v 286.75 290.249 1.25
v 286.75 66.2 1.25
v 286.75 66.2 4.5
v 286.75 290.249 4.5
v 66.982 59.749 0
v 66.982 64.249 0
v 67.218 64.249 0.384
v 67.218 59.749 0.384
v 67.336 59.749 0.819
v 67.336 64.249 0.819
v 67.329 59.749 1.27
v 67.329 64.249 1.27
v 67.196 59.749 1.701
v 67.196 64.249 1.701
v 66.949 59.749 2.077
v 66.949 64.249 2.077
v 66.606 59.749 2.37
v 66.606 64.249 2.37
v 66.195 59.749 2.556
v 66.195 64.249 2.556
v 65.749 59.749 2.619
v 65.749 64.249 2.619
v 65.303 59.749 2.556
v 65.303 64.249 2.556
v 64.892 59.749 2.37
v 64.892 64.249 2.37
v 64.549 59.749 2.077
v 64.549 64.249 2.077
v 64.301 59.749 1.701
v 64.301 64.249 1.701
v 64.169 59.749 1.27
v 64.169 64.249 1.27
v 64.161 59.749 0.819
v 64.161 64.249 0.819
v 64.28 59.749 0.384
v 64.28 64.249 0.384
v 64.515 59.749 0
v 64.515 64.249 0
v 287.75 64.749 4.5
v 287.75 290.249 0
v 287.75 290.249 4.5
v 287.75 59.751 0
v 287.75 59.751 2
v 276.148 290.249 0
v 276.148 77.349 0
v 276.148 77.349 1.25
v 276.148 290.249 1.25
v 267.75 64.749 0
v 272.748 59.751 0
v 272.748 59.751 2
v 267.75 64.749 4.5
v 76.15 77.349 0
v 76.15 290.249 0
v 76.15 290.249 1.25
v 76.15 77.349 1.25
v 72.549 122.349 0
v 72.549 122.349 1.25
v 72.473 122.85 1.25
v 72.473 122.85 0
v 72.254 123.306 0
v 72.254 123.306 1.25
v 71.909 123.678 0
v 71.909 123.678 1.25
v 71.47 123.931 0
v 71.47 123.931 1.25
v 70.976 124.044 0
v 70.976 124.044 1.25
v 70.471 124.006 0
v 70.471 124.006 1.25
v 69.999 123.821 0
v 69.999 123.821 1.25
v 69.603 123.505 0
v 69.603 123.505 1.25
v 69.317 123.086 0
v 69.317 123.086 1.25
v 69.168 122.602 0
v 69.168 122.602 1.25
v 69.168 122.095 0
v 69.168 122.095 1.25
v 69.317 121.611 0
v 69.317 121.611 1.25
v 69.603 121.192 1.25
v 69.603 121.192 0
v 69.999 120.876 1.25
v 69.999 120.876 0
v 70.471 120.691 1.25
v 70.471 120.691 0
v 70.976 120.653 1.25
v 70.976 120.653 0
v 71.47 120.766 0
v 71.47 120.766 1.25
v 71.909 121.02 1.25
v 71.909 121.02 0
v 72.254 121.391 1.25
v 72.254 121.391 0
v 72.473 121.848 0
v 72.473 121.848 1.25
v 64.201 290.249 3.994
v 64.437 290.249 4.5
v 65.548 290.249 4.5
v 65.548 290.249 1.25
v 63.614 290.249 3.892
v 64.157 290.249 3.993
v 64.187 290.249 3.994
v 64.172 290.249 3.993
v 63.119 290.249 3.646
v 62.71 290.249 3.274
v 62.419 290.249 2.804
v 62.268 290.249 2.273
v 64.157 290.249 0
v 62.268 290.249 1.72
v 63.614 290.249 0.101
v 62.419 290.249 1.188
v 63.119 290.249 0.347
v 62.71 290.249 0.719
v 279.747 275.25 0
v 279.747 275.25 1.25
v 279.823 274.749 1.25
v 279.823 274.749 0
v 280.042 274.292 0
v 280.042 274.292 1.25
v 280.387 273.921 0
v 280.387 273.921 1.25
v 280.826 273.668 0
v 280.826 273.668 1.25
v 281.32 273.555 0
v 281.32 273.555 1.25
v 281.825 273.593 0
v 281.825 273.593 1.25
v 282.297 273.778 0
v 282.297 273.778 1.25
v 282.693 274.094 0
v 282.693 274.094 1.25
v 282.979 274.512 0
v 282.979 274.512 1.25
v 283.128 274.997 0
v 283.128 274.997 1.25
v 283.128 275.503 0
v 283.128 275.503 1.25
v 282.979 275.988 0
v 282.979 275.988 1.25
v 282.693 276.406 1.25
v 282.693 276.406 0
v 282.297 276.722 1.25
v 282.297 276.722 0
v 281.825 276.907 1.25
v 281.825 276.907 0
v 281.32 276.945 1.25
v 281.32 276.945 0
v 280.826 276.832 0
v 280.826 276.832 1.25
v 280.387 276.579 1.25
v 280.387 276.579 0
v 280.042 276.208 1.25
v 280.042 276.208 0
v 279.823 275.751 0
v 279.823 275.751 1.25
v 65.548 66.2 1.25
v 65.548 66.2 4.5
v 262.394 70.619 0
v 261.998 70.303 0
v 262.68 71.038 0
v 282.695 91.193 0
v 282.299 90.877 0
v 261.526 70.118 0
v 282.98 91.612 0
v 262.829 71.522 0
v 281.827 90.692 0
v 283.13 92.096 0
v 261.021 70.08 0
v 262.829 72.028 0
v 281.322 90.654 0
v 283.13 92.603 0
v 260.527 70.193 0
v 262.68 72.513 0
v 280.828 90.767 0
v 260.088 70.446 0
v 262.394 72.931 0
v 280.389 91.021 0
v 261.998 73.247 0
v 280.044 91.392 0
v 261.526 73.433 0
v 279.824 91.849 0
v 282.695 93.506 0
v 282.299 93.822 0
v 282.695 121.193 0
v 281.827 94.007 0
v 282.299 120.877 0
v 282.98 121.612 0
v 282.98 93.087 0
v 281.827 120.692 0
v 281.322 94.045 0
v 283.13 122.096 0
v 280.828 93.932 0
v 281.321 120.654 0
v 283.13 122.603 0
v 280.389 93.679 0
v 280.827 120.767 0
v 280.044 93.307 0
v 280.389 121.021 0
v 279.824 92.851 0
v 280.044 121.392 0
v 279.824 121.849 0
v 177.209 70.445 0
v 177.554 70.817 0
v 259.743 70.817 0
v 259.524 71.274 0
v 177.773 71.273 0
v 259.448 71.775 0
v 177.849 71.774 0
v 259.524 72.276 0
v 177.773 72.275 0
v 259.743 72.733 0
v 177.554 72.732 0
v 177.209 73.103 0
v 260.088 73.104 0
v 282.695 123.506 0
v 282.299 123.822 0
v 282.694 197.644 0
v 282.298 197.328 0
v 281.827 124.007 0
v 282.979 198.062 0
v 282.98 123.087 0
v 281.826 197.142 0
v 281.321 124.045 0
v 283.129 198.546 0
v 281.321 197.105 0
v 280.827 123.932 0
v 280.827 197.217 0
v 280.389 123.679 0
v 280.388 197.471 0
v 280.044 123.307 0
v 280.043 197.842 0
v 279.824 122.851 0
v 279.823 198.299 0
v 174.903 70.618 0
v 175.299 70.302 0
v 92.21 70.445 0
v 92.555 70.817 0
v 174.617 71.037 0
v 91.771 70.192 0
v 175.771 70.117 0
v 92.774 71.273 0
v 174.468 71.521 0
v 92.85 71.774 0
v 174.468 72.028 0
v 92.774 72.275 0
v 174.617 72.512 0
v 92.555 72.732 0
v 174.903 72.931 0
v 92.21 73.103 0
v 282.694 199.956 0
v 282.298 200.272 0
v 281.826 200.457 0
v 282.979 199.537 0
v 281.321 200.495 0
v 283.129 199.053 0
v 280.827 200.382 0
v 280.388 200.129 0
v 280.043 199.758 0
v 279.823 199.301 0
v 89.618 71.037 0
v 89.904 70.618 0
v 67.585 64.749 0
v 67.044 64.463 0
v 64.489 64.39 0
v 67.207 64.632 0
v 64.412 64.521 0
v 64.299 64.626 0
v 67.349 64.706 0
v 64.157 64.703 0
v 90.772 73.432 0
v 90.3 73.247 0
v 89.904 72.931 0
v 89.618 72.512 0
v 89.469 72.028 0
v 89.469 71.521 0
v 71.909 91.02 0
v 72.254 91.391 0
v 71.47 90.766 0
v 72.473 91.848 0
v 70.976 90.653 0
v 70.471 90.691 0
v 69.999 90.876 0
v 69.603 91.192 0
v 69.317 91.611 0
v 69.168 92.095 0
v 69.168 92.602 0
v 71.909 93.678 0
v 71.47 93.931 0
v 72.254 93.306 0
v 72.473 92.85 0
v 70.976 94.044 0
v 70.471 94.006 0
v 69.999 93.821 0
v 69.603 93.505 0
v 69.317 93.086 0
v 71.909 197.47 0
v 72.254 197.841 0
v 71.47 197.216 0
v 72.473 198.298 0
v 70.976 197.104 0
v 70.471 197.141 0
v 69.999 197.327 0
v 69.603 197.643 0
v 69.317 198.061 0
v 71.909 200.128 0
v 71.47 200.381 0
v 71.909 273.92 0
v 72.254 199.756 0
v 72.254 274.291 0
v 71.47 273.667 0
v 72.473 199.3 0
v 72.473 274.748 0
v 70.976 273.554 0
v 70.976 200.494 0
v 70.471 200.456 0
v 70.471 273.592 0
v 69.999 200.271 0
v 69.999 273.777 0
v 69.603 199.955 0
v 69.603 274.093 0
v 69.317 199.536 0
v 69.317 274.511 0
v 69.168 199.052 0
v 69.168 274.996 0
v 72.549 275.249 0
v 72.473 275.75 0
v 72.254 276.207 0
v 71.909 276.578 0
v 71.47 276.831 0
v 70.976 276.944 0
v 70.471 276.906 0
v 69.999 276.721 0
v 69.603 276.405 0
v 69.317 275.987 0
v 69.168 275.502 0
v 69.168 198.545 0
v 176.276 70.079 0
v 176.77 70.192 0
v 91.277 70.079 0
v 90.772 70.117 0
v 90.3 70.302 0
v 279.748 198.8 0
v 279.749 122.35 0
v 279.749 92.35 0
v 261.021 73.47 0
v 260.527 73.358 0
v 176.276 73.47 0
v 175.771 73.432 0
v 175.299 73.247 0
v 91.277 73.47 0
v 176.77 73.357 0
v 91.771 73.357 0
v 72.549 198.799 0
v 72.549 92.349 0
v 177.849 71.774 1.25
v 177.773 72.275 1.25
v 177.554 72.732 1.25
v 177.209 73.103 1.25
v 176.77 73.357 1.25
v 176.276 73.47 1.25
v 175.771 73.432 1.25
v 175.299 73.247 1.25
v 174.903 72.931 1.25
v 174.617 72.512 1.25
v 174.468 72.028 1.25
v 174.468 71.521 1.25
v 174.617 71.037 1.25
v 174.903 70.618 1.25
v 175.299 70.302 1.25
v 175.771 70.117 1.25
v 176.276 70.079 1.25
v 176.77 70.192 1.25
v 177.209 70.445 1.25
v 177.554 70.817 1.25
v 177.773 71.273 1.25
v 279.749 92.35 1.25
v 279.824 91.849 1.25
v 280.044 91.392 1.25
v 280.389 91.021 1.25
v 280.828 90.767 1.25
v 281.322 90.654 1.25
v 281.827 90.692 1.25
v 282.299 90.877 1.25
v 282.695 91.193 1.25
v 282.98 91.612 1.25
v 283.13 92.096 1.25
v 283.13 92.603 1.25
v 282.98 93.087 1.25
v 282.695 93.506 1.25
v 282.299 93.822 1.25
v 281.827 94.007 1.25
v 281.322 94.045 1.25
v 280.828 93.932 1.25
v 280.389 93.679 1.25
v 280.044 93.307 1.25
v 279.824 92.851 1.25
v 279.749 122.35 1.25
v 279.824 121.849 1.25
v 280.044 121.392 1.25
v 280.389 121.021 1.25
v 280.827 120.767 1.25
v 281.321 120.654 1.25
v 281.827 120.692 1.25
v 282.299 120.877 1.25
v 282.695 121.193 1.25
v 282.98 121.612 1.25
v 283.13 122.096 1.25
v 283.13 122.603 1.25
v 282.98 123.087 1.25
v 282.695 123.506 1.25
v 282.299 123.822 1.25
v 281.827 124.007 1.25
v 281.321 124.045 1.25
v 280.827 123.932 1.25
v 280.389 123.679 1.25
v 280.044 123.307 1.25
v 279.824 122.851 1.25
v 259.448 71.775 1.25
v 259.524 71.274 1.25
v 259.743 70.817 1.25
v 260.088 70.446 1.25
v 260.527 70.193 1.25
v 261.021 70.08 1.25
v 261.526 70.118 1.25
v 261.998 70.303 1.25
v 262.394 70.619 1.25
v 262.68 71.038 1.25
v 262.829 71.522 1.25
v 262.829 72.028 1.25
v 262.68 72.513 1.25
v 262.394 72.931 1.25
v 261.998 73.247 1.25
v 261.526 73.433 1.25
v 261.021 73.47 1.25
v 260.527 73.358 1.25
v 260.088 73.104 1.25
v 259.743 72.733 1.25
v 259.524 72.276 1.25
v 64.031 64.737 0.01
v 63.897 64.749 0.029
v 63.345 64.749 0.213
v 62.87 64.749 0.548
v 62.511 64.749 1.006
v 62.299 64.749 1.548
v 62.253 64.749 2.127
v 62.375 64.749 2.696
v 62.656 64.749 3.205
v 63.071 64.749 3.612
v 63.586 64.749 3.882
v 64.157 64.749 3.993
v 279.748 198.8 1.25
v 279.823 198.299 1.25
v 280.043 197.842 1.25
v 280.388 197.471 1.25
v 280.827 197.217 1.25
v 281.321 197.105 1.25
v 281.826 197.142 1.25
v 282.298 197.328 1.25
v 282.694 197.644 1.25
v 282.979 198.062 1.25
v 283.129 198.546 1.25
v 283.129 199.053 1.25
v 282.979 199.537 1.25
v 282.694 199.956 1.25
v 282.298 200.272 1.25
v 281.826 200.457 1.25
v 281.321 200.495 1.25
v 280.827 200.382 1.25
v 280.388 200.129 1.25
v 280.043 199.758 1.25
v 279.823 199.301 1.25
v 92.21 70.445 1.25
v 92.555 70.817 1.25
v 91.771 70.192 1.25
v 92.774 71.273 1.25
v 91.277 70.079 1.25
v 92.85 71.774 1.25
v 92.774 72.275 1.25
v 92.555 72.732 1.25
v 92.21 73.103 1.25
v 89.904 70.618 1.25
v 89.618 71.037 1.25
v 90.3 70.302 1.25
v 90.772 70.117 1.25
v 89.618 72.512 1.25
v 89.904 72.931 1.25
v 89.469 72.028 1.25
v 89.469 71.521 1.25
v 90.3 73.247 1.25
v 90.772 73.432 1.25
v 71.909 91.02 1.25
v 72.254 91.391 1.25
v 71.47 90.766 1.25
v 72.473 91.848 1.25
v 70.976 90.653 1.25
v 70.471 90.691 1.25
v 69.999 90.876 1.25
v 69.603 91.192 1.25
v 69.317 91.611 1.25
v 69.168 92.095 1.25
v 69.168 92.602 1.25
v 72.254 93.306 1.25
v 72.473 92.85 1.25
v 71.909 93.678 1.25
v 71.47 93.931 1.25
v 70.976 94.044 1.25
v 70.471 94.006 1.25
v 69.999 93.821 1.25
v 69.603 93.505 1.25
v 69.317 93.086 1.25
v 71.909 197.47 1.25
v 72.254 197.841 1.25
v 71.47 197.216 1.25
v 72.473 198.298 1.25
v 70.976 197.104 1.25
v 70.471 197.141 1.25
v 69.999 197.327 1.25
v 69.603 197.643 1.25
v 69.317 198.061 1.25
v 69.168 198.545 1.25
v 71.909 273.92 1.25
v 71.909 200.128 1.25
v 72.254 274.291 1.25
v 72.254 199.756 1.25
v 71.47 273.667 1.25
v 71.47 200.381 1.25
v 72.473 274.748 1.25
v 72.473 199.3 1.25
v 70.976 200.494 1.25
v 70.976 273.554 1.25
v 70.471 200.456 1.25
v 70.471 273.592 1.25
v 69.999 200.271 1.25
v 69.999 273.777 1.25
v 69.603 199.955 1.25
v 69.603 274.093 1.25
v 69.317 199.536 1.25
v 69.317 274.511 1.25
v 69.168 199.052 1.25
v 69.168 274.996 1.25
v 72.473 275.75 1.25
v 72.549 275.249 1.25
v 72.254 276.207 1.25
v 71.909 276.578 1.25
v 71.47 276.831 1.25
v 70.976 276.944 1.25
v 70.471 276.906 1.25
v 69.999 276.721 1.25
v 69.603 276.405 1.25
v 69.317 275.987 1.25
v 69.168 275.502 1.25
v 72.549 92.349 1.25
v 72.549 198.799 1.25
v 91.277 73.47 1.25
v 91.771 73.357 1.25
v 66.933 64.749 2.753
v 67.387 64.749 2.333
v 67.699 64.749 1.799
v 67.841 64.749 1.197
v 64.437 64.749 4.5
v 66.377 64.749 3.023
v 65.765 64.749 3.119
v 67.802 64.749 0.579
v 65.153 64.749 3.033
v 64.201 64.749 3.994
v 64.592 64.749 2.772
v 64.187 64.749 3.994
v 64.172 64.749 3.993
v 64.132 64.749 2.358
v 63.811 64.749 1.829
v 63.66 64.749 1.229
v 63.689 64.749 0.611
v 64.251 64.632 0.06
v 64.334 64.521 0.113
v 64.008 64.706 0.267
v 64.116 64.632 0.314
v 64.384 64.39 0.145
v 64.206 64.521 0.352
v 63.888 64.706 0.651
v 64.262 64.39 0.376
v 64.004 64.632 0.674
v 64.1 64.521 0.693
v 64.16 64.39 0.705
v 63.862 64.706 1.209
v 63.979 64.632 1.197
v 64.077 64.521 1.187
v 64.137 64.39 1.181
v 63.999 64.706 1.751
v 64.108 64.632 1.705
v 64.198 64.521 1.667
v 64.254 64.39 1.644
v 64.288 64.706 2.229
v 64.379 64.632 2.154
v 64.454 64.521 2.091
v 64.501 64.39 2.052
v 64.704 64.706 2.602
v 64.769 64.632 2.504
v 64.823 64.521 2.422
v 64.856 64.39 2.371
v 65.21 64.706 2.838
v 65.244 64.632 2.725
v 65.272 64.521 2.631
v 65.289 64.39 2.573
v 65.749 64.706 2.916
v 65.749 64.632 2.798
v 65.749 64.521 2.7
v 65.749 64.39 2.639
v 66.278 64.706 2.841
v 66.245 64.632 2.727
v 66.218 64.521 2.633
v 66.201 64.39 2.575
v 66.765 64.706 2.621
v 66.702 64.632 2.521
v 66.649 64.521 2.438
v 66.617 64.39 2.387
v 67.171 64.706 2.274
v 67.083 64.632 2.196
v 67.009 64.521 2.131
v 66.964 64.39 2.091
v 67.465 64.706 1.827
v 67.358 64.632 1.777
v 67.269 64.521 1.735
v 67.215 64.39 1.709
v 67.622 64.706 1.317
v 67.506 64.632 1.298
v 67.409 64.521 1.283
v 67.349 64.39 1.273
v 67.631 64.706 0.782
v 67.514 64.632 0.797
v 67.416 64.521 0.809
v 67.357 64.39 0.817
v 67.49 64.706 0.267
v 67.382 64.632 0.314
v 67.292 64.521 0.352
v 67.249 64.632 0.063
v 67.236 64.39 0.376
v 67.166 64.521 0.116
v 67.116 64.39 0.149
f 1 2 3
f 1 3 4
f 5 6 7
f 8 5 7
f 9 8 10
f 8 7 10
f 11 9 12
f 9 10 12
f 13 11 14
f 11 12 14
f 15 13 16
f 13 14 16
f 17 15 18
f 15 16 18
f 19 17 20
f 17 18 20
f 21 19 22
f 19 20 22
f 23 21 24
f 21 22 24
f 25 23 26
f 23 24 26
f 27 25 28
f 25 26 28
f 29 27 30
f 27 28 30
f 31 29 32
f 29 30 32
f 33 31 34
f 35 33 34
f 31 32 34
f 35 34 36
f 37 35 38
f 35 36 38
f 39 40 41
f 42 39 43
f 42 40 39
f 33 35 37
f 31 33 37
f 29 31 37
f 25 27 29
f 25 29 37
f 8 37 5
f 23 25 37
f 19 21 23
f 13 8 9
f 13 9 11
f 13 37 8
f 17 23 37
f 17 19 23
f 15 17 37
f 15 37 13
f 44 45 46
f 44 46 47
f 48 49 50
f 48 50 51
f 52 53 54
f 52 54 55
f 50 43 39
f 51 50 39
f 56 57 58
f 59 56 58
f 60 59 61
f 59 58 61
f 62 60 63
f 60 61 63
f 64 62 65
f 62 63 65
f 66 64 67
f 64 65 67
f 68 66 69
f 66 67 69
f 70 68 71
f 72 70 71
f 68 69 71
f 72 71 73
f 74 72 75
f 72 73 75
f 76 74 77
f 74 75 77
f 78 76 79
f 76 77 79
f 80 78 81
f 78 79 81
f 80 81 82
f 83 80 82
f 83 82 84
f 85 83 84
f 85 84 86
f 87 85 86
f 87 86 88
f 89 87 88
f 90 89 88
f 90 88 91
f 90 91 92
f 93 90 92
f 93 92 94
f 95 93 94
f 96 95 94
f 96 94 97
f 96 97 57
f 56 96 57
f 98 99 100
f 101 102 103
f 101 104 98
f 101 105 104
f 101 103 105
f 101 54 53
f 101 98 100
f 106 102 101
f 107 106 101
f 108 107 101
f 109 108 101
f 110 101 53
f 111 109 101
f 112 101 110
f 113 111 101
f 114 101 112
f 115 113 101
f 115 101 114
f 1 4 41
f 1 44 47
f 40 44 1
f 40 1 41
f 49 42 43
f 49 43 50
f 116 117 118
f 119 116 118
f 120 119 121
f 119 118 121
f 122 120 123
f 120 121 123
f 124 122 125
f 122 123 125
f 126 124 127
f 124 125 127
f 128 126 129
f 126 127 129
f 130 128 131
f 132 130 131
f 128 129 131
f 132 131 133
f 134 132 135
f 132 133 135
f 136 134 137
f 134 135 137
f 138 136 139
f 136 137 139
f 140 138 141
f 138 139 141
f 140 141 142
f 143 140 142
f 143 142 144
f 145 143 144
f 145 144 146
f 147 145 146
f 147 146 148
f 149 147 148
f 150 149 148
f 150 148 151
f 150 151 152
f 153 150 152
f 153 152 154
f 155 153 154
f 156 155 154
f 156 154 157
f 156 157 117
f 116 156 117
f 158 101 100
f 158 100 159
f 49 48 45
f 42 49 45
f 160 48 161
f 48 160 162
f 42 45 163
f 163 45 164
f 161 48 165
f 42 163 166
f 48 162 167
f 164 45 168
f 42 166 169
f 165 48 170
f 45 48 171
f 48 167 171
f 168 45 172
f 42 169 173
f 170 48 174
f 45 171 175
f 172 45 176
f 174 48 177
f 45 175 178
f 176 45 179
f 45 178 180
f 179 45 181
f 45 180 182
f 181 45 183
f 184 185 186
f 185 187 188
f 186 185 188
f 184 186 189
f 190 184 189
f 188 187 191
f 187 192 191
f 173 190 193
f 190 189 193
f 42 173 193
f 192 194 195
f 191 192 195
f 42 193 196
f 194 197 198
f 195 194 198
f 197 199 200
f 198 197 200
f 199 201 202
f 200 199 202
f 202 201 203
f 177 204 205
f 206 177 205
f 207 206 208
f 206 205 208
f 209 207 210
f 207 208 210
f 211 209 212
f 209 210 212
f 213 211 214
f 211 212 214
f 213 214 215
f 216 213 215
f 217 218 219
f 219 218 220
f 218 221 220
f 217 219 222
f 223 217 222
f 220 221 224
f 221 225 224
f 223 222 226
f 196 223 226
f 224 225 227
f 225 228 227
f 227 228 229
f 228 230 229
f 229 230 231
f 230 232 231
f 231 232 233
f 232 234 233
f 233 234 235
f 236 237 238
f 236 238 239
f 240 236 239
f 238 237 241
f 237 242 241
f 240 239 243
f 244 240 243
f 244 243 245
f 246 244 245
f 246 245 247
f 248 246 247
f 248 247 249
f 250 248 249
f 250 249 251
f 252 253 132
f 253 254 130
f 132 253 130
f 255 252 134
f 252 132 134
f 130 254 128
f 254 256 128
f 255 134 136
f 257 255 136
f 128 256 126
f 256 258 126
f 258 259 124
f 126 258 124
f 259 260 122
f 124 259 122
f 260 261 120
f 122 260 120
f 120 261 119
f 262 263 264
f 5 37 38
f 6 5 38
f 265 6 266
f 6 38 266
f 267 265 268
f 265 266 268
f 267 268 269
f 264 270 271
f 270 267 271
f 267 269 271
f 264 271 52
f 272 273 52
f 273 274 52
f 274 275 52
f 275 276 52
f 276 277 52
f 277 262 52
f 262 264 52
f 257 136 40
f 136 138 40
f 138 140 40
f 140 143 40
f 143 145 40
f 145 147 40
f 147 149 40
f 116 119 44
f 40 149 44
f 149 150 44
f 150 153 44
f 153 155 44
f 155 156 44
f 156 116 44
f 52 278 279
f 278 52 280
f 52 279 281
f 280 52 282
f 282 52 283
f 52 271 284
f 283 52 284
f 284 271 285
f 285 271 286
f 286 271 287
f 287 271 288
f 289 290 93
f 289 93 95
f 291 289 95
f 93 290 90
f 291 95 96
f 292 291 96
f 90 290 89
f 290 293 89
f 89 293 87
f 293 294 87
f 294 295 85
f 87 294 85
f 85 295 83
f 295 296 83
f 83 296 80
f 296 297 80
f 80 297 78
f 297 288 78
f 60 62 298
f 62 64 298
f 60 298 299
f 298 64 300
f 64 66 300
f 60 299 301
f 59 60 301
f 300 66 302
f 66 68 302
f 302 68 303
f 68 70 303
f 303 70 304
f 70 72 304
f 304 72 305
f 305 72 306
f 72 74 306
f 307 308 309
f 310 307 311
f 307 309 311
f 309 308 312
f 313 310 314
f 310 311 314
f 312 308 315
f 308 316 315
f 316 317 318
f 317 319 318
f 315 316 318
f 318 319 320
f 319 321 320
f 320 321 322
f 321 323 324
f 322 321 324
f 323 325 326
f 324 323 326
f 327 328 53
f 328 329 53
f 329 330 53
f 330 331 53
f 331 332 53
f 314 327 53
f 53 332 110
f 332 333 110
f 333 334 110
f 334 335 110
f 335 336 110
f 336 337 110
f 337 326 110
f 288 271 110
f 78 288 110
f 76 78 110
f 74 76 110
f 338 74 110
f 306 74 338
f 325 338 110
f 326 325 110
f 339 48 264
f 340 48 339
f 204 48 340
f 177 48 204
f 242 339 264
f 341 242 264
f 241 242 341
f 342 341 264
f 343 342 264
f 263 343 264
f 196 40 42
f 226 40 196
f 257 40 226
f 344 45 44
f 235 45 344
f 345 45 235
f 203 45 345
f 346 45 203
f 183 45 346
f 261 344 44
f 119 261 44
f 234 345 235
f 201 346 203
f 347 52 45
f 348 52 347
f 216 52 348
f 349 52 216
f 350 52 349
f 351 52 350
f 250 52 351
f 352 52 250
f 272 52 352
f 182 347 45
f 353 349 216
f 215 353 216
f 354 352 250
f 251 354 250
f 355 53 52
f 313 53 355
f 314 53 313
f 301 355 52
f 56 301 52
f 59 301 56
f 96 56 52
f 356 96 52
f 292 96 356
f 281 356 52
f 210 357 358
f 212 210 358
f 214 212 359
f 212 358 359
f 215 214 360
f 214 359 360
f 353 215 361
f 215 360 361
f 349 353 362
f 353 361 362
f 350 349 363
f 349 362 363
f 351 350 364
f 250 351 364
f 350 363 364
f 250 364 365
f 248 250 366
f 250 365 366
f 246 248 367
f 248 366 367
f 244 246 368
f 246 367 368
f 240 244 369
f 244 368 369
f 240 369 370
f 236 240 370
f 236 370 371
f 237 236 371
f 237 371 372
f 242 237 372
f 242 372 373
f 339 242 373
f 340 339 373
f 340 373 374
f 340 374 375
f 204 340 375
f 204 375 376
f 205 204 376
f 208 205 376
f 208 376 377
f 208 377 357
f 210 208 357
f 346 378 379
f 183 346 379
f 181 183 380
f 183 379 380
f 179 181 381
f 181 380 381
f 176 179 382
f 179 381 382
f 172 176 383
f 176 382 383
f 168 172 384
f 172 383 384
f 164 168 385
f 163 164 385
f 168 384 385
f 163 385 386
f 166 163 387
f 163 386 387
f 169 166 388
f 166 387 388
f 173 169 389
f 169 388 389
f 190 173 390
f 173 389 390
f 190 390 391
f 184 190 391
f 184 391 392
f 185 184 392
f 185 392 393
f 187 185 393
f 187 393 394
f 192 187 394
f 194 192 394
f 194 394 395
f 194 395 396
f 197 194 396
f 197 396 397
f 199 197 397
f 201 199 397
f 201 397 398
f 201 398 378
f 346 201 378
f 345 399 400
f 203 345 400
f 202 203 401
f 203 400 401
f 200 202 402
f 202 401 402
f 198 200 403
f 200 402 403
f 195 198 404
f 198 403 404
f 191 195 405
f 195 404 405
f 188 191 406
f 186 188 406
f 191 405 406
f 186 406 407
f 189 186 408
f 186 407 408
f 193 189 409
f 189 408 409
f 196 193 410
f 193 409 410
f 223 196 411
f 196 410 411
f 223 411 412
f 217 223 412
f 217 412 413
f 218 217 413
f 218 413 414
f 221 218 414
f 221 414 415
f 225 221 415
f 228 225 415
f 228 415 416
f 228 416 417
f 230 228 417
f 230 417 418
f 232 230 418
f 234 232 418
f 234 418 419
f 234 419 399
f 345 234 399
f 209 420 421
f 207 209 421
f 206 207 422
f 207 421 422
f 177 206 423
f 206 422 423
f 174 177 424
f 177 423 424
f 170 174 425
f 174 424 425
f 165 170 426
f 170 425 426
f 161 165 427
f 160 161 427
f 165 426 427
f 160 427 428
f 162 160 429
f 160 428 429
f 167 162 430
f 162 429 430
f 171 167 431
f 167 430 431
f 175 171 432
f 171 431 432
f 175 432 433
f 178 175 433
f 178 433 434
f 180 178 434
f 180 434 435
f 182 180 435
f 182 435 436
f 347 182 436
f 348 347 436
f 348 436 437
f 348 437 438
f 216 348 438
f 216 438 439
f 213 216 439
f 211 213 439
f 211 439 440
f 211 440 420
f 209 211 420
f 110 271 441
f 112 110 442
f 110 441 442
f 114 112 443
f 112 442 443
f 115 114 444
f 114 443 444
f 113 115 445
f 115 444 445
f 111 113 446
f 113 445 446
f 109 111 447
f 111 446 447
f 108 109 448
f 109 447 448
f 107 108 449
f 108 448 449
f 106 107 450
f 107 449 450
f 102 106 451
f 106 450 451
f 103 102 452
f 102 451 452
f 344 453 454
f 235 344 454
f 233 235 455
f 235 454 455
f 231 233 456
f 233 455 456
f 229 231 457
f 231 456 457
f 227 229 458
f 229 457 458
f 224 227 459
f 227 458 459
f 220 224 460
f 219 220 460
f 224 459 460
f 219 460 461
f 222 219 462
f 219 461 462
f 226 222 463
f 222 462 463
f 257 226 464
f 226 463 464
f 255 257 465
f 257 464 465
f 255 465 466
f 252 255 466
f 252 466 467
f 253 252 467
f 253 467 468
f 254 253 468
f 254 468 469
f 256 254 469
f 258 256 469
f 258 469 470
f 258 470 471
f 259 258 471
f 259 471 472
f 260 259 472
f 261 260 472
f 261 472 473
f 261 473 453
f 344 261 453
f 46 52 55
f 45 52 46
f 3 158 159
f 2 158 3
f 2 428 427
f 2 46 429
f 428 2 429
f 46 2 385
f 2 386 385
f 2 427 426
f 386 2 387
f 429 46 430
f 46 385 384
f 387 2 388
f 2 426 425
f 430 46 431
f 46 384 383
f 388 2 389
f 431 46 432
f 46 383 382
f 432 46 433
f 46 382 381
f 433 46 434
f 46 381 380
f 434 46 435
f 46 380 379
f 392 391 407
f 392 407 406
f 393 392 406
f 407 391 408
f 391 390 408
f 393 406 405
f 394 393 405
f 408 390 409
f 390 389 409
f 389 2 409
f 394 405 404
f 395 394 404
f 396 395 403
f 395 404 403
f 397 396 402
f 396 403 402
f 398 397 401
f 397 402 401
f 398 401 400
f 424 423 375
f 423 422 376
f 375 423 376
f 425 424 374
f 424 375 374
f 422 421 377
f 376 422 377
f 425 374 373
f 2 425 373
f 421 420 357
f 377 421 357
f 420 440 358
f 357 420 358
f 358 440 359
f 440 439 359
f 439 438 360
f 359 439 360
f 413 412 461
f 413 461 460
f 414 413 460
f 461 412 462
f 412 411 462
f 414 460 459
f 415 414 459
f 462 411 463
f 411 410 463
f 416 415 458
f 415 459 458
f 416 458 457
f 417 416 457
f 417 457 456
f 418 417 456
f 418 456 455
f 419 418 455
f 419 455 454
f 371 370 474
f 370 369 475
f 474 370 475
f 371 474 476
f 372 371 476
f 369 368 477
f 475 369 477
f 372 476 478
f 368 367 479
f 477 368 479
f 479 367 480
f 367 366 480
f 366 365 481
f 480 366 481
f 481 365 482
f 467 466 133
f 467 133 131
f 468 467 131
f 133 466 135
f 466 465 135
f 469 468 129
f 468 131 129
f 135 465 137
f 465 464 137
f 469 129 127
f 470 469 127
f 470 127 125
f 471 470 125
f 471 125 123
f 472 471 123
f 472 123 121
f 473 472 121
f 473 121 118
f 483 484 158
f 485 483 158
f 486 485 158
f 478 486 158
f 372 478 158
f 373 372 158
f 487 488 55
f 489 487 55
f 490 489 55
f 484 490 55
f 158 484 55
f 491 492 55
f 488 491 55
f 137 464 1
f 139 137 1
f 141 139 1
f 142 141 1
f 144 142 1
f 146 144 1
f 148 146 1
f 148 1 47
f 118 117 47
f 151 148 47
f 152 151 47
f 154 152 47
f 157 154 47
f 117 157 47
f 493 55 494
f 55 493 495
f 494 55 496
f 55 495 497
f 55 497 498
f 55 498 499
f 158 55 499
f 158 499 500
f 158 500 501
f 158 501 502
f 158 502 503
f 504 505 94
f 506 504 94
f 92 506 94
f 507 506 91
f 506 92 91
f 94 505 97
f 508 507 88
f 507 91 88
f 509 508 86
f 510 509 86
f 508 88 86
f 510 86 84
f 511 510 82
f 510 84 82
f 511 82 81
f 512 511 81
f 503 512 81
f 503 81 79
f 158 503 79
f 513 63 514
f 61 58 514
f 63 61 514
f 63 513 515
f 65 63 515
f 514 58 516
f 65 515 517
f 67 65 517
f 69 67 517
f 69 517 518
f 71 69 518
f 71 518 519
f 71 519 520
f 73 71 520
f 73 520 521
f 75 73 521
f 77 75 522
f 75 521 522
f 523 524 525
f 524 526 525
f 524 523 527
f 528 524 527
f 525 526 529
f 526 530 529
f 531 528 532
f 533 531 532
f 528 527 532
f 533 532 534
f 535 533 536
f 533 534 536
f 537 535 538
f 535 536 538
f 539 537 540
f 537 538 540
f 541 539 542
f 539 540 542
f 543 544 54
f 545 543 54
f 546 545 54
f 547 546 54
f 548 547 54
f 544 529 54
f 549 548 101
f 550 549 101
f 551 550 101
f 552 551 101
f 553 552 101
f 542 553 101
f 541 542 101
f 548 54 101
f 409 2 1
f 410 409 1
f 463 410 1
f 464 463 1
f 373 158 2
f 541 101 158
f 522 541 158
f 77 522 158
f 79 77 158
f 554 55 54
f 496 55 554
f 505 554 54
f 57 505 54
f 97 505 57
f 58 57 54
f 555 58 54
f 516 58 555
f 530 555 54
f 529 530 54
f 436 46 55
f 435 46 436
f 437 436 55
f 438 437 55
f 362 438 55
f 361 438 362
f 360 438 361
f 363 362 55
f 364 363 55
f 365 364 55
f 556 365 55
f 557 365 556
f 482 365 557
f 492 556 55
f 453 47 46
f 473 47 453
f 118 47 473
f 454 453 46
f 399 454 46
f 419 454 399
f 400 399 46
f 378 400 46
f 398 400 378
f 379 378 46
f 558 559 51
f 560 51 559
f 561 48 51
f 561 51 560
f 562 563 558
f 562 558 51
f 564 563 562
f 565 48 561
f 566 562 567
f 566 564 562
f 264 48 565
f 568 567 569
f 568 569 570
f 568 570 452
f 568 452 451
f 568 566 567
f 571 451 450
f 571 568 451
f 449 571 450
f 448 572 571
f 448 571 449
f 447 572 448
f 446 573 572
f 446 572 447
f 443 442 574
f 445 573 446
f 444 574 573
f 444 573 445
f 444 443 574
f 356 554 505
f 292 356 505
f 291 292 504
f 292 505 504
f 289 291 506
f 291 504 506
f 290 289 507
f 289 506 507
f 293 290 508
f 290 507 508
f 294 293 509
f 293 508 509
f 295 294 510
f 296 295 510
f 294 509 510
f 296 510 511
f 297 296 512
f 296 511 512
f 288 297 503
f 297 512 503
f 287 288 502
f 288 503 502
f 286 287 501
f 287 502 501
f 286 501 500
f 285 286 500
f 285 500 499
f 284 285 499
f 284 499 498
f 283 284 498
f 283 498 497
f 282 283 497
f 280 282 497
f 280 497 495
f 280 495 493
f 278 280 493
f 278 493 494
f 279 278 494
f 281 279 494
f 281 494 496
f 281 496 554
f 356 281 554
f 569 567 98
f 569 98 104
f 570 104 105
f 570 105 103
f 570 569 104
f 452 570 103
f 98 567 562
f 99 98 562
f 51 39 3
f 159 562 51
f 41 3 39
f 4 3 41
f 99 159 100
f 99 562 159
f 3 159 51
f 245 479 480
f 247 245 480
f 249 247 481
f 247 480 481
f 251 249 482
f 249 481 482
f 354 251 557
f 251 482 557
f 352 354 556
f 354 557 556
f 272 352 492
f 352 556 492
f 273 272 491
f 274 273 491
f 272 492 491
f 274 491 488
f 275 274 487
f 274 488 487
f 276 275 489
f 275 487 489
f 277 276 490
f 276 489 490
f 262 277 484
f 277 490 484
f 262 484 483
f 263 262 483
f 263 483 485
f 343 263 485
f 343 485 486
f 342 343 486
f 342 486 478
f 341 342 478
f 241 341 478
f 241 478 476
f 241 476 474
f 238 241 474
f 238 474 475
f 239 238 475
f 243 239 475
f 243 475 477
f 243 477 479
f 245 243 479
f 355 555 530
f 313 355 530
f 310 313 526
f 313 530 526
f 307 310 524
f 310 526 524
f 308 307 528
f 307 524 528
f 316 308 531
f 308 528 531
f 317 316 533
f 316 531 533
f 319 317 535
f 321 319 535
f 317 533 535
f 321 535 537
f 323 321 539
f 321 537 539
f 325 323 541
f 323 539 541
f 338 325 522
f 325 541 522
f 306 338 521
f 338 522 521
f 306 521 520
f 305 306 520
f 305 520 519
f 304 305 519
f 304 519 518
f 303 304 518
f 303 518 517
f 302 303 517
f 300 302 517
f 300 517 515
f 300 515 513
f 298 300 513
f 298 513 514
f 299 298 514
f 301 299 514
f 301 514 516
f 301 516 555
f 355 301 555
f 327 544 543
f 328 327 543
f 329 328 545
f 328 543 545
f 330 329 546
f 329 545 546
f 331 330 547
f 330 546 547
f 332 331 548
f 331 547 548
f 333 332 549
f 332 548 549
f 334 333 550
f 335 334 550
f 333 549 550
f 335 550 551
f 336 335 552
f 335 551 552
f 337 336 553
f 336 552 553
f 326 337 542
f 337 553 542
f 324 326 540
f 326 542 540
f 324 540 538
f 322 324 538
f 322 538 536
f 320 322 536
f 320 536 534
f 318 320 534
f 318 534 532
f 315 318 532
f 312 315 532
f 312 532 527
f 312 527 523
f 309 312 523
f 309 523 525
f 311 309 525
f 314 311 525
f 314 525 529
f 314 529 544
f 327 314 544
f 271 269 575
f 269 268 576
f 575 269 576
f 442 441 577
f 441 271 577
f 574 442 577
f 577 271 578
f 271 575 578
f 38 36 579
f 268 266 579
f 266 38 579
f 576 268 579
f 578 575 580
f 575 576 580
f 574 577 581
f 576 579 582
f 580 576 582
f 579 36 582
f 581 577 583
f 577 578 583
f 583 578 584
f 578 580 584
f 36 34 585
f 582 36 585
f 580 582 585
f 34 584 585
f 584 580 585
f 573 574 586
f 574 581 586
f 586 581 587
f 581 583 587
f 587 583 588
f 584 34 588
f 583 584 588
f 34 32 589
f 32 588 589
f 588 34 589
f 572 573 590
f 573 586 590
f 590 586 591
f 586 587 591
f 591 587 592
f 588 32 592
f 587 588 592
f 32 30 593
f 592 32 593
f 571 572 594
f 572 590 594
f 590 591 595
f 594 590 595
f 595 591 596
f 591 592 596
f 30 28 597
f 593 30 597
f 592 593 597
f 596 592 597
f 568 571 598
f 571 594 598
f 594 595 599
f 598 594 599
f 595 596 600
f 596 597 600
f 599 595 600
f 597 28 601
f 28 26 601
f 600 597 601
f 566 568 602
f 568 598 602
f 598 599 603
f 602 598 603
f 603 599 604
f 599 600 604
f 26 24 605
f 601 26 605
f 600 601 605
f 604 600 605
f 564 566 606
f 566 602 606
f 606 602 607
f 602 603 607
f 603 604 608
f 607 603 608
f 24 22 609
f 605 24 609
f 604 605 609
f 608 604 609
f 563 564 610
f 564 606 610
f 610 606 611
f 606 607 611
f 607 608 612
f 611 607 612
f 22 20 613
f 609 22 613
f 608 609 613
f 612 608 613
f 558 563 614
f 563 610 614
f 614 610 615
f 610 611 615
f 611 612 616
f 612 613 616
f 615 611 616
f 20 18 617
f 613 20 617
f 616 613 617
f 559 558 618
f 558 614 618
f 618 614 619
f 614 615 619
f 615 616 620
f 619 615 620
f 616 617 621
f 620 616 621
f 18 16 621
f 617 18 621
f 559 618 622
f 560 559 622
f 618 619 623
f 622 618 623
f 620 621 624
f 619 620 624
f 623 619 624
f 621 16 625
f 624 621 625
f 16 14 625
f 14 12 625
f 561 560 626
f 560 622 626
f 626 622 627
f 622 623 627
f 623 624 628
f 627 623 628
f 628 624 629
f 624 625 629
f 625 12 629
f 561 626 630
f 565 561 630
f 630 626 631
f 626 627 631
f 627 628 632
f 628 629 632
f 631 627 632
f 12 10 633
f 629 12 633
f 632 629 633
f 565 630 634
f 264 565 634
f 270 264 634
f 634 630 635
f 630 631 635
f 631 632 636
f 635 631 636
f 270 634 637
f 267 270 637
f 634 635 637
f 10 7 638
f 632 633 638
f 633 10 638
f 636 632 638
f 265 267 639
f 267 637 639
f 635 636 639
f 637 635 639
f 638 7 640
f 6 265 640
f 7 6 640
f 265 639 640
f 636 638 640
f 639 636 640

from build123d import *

# Parameters (mm, degrees)
SALIENTE_EXTRUIR1_DEPTH = 1.25
SALIENTE_EXTRUIR2_DEPTH = 3.25
SALIENTE_EXTRUIR3_DEPTH = 5
SALIENTE_EXTRUIR4_DEPTH = 225.499987602
SALIENTE_EXTRUIR6_REACH = 368.413
CROQUIS6_W              = 4.5
CROQUIS6_H              = 225.499987602
CHAFL_N1_SIZE           = 0.6
CHAFL_N1_SIZE_2         = 0.279784595
REDONDEO1_R             = 0.5
CORTAR_EXTRUIR1_REACH   = 369.581
CROQUIS8_R              = 1.7
CORTAR_EXTRUIR2_DEPTH   = 409.723751009


with BuildPart() as part:
    # Croquis1 → Saliente-Extruir1 (new body)
    with BuildSketch(Plane.XY):
        Polygon((287.750005722, 59.751000255), (272.747904062, 59.751000255), (267.749905586, 64.749002457), (64.157357861, 64.749002457), (64.553998411, 290.248990059), (76.149903238, 290.248990059), (76.149903238, 77.348701656), (276.148021221, 77.348701656), (276.148021221, 290.248990059), (287.750005722, 290.248990059), align=None)
    extrude(amount=SALIENTE_EXTRUIR1_DEPTH)

    # Croquis2 → Saliente-Extruir2 (add)
    with BuildSketch(Plane.XY.offset(1.25)):
        Polygon((286.75003751, 290.248990059), (287.750005722, 290.248990059), (287.750005722, 59.751000255), (272.747904062, 59.751000255), (267.749905586, 64.749002457), (64.157357861, 64.749002457), (64.553998411, 290.248990059), (65.547994841, 290.248990059), (65.547994841, 66.199905073), (286.75003751, 66.199905073), align=None)
    extrude(amount=SALIENTE_EXTRUIR2_DEPTH)

    # Croquis3 → Saliente-Extruir3 (add)
    with BuildSketch(Plane.XZ.offset(-64.749002457)):
        with BuildLine():
            Line((64.515409591, 0), (66.982480076, 0))
            ThreePointArc((66.982480076, 0), (65.748944833, 2.619014625), (64.515409591, 0))
        make_face()
    extrude(amount=SALIENTE_EXTRUIR3_DEPTH)

    # Saliente-Extruir6: up to this face of the body (flat: up to its plane)
    saliente_extruir6_end = Plane(part.part.faces().sort_by_distance((64.355678136, 177.498996258, 2.25))[0])
    # Croquis6 → Saliente-Extruir6 (add, up to the picked face)
    with BuildSketch(Plane(origin=(64.157357861, 0, 0), x_dir=(0, 0, -1), z_dir=(1, 0, 0)), mode=Mode.PRIVATE) as saliente_extruir6_sk1:
        with Locations((-2.25, 177.498996258)):
            Rectangle(CROQUIS6_W, CROQUIS6_H)
    saliente_extruir6_tool1 = split(extrude(saliente_extruir6_sk1.sketch, amount=SALIENTE_EXTRUIR6_REACH, mode=Mode.PRIVATE), bisect_by=saliente_extruir6_end, keep=Keep.BOTH, mode=Mode.PRIVATE)


with BuildPart() as body_2:
    # Croquis3<3> → Saliente-Extruir4 (new body)
    with BuildSketch(Plane.XZ.offset(-64.749002457)):
        with BuildLine():
            Line((64.157357861, 3.992626763), (64.157357861, 0))
            ThreePointArc((64.157357861, 0), (62.24843494, 1.996313381), (64.157357861, 3.992626763))
        make_face()
    extrude(amount=-SALIENTE_EXTRUIR4_DEPTH)


with BuildPart() as part_1:
    add(part.part)

    add(body_2.part)  # Saliente-Extruir6 merges body 2
    add(saliente_extruir6_tool1.solids().sort_by(Axis((64.157358, 177.498996, 2.25), (1, 0, 0)))[0])

    # Chaflán1
    # the kernel refuses this chamfer: 0.6, 0.279784595 mm, written as the material it takes off along each edge
    with BuildSketch(Plane(origin=(64.157357861, 63.194417174, 4.5), x_dir=(-0.016311164131115618, 0, -0.9998669641130703), z_dir=(0, 1, 0))) as chafl_n1_piece_1_section:
        Polygon((CHAFL_N1_SIZE * 0.999866964113, -CHAFL_N1_SIZE * 0.0163111641311), (-CHAFL_N1_SIZE_2 * 0.0163111641249, -CHAFL_N1_SIZE_2 * 0.999866963731), (0, 0), align=None)
    chafl_n1_piece_1 = extrude(amount=228.609158168, mode=Mode.PRIVATE)
    chafl_n1_piece_1 = chafl_n1_piece_1 - Plane(origin=(64.246748688, 177.498996258, 1.996313381), x_dir=(-0.044733129364357686, 0, -0.9989989725406486), z_dir=(0, -1, 0)) * Cylinder(1.998313748, 460, mode=Mode.PRIVATE)
    add(chafl_n1_piece_1, mode=Mode.SUBTRACT)

    # Redondeo1
    redondeo1_edges = [part_1.edges().sort_by_distance(p)[0] for p in [
        (65.748944833, 64.749002457, 2.619014625),
    ]]
    fillet(redondeo1_edges, radius=REDONDEO1_R)

    # Cortar-Extruir1: up to this plane
    cortar_extruir1_end = Plane(origin=(272.747904062, 59.751000255, 1.25), z_dir=(0.7071070447096931, 0.7071065176633039, 0))
    # Croquis7 → Cortar-Extruir1 (cut, up to the surface)
    with BuildSketch(Plane(origin=(287.750005722, 0, 0), x_dir=(0, 0, -1), z_dir=(1, 0, 0)), mode=Mode.PRIVATE) as cortar_extruir1_sk1:
        Polygon((-2, 59.751000255), (-4.5, 64.749002457), (-4.5, 59.751000255), align=None)
    cortar_extruir1_tool1 = split(extrude(cortar_extruir1_sk1.sketch, amount=-CORTAR_EXTRUIR1_REACH, mode=Mode.PRIVATE), bisect_by=cortar_extruir1_end, keep=Keep.BOTH, mode=Mode.PRIVATE)
    add(cortar_extruir1_tool1.solids().sort_by_distance((287.750006, 61.417001, 3.666667))[0], mode=Mode.SUBTRACT)

    # Croquis8 → Cortar-Extruir2 (cut, through all)
    with BuildSketch(Plane.XY.offset(1.25)):
        with Locations((176.148989202, 71.774303364)):
            Circle(CROQUIS8_R)
        with Locations((91.149903238, 71.774303364)):
            Circle(CROQUIS8_R)
        with Locations(Location((261.148075163, 71.775125937, 0), (0, 0, 180))):
            Circle(CROQUIS8_R)
        with Locations((70.848949039, 92.348701656)):
            Circle(CROQUIS8_R)
        with Locations((70.848949039, 122.348701656)):
            Circle(CROQUIS8_R)
        with Locations((70.848949039, 275.248990059)):
            Circle(CROQUIS8_R)
        with Locations((70.848949039, 198.798845857)):
            Circle(CROQUIS8_R)
        with Locations(Location((281.44853993, 122.349720687, 0), (0, 0, 180))):
            Circle(CROQUIS8_R)
        with Locations(Location((281.447800089, 198.799864885, 0), (0, 0, 180))):
            Circle(CROQUIS8_R)
        with Locations(Location((281.447060248, 275.250009083, 0), (0, 0, 180))):
            Circle(CROQUIS8_R)
        with Locations(Location((281.448830253, 92.349720689, 0), (0, 0, 180))):
            Circle(CROQUIS8_R)
    extrude(amount=-CORTAR_EXTRUIR2_DEPTH, mode=Mode.SUBTRACT)


solid = part_1.part
